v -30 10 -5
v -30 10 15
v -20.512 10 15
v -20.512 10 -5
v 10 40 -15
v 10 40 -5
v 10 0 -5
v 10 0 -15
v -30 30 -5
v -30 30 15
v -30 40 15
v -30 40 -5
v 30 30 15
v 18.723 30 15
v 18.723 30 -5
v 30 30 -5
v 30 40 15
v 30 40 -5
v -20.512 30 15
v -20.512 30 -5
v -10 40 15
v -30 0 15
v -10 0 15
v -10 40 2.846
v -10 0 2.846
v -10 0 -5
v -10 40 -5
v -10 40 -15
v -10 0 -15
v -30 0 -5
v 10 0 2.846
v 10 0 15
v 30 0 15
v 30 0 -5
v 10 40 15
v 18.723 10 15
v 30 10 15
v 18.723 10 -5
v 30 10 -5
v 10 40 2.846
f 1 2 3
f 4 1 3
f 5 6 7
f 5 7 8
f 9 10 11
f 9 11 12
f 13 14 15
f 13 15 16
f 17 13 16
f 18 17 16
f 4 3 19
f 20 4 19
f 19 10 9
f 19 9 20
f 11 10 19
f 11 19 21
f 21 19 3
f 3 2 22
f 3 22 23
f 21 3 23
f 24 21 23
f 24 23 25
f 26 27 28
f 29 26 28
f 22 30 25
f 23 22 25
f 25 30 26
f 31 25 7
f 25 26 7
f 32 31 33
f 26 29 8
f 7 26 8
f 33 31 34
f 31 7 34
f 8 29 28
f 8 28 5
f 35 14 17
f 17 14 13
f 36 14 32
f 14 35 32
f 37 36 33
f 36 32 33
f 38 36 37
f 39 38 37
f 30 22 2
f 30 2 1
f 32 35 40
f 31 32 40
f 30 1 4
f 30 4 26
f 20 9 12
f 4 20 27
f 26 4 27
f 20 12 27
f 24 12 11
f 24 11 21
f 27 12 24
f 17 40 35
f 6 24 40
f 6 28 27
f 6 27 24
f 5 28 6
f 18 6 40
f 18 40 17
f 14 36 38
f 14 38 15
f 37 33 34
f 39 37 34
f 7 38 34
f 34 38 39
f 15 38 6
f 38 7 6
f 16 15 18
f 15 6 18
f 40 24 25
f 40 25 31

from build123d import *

# Parameters (mm, degrees)
CROQUIS1_W              = 60
CROQUIS1_H              = 30
SALIENTE_EXTRUIR2_DEPTH = 40
CROQUIS2_W              = 20
CROQUIS2_H              = 12.153687435
CORTAR_EXTRUIR1_DEPTH   = 41
CROQUIS3_W              = 20
CROQUIS3_H              = 10
CORTAR_EXTRUIR2_DEPTH   = 41
CROQUIS4_W              = 20
CROQUIS4_H              = 10
CORTAR_EXTRUIR3_DEPTH   = 41
CROQUIS5_W              = 11.276599724
CROQUIS5_H              = 20
CORTAR_EXTRUIR4_DEPTH   = 40
CROQUIS6_W              = 9.488499603
CROQUIS6_H              = 20
CORTAR_EXTRUIR5_DEPTH   = 40


with BuildPart() as part:
    # Croquis1 → Saliente-Extruir2 (new body)
    with BuildSketch(Plane(origin=(0, 0, 0), x_dir=(1, 0, 0), z_dir=(0, 1, 0))):
        Rectangle(CROQUIS1_W, CROQUIS1_H)
    extrude(amount=SALIENTE_EXTRUIR2_DEPTH)

    # Croquis2 → Cortar-Extruir1 (cut, through all)
    with BuildSketch(Plane(origin=(0, 40, 0), x_dir=(1, 0, 0), z_dir=(0, 1, 0))):
        with Locations((0, -8.923156283)):
            Rectangle(CROQUIS2_W, CROQUIS2_H)
    extrude(amount=-CORTAR_EXTRUIR1_DEPTH, mode=Mode.SUBTRACT)

    # Croquis3 → Cortar-Extruir2 (cut, through all)
    with BuildSketch(Plane(origin=(0, 40, 0), x_dir=(1, 0, 0), z_dir=(0, 1, 0))):
        with Locations((-20, 10)):
            Rectangle(CROQUIS3_W, CROQUIS3_H)
    extrude(amount=-CORTAR_EXTRUIR2_DEPTH, mode=Mode.SUBTRACT)

    # Croquis4 → Cortar-Extruir3 (cut, through all)
    with BuildSketch(Plane(origin=(0, 40, 0), x_dir=(1, 0, 0), z_dir=(0, 1, 0))):
        with Locations((20, 10)):
            Rectangle(CROQUIS4_W, CROQUIS4_H)
    extrude(amount=-CORTAR_EXTRUIR3_DEPTH, mode=Mode.SUBTRACT)

    # Croquis5 → Cortar-Extruir4 (cut)
    with BuildSketch(Plane.XY.offset(15)):
        with Locations((24.361700138, 20)):
            Rectangle(CROQUIS5_W, CROQUIS5_H)
    extrude(amount=-CORTAR_EXTRUIR4_DEPTH, mode=Mode.SUBTRACT)

    # Croquis6 → Cortar-Extruir5 (cut)
    with BuildSketch(Plane.XY.offset(15)):
        with Locations((-25.255750199, 20)):
            Rectangle(CROQUIS6_W, CROQUIS6_H)
    extrude(amount=-CORTAR_EXTRUIR5_DEPTH, mode=Mode.SUBTRACT)


solid = part.part
